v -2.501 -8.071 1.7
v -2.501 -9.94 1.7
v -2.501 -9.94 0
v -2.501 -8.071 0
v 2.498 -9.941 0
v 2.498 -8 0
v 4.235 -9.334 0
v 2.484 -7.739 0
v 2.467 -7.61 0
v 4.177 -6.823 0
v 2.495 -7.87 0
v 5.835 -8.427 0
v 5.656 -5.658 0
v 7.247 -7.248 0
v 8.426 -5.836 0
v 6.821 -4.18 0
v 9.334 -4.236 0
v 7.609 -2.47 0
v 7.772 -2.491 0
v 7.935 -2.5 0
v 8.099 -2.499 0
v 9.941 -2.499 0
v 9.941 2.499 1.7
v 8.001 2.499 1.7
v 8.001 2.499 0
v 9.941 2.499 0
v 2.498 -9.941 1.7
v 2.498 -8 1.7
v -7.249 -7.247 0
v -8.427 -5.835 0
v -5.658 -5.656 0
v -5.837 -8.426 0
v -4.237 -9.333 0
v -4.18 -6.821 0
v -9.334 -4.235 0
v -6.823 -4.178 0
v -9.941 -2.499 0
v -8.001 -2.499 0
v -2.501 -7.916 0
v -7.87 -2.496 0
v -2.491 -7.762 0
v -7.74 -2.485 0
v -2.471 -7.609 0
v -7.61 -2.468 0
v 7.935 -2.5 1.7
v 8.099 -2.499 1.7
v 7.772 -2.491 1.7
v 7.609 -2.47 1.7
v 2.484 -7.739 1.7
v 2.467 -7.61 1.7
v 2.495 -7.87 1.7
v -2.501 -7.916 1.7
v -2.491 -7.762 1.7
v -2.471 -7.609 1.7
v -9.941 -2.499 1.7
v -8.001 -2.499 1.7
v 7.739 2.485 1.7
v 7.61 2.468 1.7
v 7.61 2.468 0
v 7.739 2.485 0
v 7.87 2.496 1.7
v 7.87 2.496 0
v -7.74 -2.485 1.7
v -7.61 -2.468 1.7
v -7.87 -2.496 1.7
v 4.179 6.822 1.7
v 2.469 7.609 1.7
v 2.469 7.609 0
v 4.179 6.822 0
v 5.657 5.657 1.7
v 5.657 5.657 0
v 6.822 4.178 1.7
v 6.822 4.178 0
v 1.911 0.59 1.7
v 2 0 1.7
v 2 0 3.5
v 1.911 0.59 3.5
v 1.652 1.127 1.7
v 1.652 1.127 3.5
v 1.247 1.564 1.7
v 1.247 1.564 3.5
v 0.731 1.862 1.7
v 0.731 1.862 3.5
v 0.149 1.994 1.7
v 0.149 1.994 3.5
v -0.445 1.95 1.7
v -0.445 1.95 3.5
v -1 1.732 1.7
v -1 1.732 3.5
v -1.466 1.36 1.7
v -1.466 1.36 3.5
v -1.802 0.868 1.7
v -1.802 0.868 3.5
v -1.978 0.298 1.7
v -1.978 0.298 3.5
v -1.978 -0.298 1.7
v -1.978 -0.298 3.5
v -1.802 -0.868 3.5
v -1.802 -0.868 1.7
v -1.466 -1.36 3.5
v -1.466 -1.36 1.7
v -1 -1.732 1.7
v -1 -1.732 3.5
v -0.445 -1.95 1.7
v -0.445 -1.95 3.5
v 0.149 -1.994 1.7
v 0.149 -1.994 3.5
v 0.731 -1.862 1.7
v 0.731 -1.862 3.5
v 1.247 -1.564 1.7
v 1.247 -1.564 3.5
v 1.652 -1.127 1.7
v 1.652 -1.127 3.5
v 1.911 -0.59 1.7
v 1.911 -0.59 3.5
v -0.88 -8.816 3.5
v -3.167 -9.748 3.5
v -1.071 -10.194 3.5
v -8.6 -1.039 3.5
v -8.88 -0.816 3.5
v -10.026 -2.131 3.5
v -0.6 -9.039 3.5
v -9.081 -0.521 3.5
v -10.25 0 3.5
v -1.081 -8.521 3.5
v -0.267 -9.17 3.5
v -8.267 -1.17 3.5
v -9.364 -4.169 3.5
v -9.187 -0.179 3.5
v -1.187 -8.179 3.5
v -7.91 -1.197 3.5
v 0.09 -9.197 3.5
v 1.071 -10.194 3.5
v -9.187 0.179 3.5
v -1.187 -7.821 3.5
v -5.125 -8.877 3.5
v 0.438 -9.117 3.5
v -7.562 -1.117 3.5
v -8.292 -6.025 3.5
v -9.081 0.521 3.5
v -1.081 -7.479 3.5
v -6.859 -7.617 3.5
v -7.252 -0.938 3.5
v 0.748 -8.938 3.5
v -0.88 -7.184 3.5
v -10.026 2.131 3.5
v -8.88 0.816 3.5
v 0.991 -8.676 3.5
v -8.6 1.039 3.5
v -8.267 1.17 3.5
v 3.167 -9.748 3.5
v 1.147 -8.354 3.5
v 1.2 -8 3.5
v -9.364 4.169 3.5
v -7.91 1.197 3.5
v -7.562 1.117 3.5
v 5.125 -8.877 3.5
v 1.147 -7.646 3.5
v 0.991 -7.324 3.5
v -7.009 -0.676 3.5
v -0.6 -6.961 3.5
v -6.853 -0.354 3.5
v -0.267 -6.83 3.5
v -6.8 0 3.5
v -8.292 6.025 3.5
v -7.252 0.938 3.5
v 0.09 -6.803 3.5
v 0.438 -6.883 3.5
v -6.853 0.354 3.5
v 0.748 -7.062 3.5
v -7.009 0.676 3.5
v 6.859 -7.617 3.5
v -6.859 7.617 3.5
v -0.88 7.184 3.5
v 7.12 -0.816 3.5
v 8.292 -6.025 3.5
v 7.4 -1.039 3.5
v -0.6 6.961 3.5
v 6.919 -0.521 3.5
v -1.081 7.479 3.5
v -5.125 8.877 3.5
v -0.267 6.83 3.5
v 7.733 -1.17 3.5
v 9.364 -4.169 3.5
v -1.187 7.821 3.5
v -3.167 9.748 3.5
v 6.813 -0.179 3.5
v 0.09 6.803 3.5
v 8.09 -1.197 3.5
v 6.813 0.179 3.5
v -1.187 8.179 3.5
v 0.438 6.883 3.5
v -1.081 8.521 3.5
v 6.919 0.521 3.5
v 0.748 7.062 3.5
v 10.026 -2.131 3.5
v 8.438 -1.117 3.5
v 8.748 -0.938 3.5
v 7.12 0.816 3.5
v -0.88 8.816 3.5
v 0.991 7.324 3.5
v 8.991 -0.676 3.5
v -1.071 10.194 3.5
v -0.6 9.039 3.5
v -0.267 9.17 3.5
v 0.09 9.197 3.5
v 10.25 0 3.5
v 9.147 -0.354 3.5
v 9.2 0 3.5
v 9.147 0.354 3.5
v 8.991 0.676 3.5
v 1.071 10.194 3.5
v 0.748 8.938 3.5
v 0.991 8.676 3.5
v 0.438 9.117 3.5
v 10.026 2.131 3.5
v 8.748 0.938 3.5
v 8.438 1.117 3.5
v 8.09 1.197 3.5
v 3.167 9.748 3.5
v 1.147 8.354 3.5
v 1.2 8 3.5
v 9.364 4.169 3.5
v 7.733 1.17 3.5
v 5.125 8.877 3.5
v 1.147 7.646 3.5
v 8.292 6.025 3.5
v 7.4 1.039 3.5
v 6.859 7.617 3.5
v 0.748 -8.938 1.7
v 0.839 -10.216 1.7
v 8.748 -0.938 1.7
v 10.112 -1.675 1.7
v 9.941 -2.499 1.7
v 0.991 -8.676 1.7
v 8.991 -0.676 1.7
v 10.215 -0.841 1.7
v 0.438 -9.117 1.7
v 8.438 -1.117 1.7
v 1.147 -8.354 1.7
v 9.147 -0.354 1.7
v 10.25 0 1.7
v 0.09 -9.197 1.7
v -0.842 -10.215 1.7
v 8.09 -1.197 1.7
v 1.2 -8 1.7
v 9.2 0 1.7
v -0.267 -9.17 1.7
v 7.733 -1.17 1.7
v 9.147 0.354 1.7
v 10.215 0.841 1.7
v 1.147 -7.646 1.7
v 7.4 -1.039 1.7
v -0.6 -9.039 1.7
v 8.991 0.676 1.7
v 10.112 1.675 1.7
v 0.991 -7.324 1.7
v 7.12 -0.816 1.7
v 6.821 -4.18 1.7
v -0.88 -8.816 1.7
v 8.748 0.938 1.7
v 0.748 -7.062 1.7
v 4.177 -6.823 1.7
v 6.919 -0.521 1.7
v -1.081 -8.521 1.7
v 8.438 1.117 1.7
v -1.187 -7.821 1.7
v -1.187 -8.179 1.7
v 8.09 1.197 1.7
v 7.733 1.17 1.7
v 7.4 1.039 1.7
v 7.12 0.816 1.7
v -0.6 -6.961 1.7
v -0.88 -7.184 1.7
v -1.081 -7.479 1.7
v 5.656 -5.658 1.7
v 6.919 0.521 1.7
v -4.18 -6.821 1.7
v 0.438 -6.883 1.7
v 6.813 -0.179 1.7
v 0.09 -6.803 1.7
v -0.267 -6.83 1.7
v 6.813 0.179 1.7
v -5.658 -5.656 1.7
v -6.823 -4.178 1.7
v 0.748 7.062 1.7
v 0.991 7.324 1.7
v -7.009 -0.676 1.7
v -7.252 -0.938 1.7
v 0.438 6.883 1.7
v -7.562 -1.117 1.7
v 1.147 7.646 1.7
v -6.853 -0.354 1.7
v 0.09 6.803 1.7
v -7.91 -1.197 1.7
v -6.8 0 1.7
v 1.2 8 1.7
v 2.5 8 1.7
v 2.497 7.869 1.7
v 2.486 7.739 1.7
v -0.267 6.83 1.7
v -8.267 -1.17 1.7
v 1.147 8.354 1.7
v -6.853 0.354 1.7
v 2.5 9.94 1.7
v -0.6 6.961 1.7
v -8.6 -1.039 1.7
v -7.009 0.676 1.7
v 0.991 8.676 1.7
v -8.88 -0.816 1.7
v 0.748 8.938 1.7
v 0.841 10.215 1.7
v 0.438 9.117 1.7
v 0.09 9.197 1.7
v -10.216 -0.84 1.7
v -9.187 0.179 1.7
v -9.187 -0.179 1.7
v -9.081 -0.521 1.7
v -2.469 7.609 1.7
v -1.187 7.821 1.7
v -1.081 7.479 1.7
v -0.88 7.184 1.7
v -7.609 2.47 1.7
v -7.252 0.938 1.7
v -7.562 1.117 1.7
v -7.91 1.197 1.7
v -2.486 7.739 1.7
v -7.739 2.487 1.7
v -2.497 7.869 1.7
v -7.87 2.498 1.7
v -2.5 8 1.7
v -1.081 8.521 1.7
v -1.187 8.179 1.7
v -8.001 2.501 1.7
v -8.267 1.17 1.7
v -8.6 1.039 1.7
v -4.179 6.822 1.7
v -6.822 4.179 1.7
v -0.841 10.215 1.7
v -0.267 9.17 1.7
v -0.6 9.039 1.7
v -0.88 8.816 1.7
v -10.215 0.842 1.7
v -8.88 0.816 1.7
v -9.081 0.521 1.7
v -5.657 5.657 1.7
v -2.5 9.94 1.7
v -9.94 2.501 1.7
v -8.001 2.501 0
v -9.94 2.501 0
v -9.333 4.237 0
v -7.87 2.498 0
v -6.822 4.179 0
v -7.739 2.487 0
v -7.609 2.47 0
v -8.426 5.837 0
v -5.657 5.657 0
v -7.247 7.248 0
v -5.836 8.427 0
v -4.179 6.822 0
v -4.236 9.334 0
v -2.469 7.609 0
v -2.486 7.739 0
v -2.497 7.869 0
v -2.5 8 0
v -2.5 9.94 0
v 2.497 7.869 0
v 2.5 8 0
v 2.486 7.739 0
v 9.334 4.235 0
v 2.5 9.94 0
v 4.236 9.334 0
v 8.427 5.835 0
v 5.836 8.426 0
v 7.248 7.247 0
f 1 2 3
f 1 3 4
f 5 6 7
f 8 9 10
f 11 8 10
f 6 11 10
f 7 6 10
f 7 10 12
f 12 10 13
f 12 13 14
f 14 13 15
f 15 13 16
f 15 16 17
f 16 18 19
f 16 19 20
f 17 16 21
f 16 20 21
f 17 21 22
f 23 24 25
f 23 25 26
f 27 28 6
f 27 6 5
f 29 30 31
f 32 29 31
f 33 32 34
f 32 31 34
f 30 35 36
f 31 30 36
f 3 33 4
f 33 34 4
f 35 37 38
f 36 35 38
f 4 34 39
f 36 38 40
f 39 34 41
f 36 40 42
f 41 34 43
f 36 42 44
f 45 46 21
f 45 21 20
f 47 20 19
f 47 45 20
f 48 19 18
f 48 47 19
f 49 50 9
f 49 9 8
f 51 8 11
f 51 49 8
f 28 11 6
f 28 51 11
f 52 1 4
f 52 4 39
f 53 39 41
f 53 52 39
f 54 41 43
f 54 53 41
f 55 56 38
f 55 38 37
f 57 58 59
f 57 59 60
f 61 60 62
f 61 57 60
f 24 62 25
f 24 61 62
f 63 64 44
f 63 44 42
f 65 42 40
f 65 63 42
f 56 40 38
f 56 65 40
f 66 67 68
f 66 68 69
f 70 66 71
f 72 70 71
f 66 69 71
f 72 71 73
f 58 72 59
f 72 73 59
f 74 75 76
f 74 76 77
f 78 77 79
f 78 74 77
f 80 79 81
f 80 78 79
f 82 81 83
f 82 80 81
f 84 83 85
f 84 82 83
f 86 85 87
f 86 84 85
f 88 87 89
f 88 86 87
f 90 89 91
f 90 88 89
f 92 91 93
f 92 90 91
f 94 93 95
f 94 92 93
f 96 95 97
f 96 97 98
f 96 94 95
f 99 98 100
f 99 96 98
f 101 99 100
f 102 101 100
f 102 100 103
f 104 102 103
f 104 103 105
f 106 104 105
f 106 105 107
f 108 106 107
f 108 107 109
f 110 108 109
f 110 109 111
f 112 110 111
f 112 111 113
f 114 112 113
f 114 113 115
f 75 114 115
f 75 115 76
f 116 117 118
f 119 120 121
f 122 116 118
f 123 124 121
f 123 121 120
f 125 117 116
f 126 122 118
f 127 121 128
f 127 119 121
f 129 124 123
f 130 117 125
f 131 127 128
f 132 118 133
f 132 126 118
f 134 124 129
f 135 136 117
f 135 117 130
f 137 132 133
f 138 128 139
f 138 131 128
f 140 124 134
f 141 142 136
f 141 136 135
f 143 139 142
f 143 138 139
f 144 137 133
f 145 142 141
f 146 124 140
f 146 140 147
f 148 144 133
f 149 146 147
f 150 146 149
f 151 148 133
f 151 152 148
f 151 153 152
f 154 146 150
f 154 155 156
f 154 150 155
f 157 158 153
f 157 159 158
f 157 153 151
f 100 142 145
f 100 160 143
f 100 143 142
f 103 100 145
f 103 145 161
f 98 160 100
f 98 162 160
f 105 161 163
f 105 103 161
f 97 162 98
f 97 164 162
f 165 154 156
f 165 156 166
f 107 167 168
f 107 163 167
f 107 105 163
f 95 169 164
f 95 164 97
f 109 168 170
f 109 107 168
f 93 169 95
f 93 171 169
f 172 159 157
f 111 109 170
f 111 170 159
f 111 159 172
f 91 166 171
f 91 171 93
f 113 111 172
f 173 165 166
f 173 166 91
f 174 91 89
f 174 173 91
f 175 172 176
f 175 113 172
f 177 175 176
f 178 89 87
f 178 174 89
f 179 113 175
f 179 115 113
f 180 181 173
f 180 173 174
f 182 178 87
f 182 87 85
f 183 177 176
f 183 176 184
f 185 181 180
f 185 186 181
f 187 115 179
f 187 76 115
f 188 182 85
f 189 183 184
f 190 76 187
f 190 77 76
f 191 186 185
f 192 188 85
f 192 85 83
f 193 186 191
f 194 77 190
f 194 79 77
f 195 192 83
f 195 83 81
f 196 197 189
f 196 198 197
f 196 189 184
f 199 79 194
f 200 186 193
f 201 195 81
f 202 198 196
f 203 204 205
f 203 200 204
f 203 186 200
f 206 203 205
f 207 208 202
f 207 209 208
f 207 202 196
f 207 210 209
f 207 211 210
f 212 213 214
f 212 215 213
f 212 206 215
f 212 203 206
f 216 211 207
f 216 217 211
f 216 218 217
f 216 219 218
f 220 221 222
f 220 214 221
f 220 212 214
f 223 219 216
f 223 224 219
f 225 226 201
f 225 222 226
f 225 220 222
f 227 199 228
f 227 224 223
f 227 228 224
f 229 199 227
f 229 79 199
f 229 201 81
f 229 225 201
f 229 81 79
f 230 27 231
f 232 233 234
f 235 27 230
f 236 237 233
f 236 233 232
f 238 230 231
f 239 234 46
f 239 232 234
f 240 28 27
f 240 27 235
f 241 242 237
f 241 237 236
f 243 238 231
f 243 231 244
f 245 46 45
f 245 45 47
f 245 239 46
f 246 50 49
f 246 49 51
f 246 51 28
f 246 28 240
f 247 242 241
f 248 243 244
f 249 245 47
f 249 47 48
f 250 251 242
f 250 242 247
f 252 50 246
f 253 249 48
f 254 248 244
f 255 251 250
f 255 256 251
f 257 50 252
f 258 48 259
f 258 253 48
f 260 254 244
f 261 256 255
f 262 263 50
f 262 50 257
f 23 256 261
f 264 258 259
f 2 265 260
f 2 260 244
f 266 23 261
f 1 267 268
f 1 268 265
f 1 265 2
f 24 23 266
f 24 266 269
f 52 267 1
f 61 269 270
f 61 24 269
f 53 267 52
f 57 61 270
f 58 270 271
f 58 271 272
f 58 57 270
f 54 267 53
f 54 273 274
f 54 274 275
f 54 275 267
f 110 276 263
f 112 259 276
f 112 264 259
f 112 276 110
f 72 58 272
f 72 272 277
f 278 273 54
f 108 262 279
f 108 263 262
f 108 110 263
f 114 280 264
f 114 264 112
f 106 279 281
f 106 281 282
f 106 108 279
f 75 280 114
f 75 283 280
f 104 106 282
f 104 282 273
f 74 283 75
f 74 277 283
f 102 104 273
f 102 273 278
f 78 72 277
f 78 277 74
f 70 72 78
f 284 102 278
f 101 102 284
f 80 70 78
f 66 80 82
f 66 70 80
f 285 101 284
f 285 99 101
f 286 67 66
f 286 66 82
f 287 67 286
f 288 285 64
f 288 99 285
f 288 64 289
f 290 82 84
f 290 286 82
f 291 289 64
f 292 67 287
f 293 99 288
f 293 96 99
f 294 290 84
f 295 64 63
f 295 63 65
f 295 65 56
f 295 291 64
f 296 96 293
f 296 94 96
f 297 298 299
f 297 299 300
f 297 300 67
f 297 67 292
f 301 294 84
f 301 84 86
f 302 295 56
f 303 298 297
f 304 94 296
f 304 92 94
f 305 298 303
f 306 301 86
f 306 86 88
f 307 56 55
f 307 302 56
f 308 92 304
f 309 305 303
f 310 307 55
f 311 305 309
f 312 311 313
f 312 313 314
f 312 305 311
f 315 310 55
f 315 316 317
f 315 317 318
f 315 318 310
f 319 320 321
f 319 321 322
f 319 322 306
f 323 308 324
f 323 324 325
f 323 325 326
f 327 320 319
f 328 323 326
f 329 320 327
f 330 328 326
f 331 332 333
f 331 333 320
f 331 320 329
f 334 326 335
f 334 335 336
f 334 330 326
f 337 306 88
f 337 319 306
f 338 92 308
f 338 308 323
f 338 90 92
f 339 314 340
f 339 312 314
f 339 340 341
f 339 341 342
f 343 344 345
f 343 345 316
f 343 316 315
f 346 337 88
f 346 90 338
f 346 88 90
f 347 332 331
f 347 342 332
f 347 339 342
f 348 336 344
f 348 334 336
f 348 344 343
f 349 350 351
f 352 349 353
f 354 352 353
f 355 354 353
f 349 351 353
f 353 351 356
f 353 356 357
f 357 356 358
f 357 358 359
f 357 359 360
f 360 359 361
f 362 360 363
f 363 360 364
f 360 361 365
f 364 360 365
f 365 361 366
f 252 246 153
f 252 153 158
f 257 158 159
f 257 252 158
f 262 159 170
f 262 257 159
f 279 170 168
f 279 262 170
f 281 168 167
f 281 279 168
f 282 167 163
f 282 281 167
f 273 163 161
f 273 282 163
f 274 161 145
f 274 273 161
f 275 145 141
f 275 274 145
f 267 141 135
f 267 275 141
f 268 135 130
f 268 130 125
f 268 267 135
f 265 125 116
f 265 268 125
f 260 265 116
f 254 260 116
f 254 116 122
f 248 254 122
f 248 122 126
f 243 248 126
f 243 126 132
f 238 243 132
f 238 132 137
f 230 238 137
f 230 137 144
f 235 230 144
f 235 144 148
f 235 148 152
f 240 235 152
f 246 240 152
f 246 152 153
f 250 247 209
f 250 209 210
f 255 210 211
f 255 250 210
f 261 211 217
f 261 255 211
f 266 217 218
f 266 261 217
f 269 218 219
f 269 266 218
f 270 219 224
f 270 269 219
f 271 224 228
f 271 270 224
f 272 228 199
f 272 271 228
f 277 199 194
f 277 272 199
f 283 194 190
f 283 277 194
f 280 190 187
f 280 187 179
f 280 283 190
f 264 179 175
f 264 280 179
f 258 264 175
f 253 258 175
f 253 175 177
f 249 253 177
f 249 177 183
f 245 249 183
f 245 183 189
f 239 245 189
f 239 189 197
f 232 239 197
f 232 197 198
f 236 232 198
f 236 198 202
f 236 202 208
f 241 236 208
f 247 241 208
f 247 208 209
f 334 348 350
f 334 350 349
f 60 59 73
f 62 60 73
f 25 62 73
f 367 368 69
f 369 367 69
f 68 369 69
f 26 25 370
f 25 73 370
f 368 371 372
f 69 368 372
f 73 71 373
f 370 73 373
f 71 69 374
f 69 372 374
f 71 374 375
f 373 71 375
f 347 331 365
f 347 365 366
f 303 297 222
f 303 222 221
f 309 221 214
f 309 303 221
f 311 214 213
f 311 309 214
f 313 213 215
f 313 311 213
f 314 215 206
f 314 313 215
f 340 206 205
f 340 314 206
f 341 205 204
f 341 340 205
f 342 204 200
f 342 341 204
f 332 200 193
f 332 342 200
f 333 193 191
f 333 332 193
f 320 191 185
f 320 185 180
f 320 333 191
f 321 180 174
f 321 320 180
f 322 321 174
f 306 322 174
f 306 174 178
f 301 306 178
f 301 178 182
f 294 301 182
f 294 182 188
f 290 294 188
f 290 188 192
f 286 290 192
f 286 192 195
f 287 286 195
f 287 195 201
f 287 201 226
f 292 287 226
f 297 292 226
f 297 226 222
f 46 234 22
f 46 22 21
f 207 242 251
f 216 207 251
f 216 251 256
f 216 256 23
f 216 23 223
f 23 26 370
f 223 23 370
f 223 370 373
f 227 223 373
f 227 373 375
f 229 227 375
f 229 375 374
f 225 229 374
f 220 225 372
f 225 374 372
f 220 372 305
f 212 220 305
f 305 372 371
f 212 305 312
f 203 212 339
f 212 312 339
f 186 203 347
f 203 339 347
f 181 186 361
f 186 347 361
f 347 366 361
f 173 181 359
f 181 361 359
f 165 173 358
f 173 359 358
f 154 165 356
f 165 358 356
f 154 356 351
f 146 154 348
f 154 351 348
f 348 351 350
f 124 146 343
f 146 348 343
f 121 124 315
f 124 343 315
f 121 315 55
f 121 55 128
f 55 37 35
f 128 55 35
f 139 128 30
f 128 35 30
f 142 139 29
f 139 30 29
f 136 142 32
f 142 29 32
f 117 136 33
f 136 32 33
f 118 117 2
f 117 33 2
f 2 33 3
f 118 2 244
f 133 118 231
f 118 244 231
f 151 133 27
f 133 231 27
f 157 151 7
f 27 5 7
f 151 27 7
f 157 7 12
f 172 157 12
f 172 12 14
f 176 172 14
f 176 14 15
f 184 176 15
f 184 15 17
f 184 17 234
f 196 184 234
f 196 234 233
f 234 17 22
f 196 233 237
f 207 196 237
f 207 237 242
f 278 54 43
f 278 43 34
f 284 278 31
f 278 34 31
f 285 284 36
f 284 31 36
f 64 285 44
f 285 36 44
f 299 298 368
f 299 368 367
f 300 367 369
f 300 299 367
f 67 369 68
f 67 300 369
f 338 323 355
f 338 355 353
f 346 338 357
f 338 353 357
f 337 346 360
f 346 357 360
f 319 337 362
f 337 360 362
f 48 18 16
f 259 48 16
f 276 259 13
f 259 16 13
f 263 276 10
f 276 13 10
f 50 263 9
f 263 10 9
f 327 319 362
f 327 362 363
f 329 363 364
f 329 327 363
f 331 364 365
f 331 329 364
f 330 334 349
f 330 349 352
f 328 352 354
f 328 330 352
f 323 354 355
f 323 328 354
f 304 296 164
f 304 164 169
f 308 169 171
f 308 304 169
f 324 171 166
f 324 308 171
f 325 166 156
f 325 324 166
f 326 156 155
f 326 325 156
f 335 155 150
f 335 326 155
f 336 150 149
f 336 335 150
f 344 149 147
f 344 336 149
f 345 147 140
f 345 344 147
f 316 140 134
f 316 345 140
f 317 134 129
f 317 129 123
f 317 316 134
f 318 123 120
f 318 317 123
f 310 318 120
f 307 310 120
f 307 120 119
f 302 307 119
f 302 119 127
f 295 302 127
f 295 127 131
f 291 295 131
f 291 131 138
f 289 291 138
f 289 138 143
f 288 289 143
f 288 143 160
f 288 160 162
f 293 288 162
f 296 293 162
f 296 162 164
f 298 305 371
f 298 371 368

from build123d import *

# Parameters (mm, degrees)
SKETCH1_R              = 10.25
SKETCH1_R_2            = 2
SKETCH1_R_3            = 1.2
BOSS_EXTRUDE1_DEPTH    = 3.5
CUT_EXTRUDE2_START     = -1.7
CUT_EXTRUDE2_OUTLINE_R = 1.2
CUT_EXTRUDE2_DEPTH     = 1.7
SKETCH6_R              = 8
CUT_EXTRUDE4_DEPTH     = 1.7


# Read off the part's stored shape, not the designer's step: Cut-Extrude2
with BuildPart() as part:
    # Sketch1 → Boss-Extrude1 (new body)
    with BuildSketch(Plane.XY):
        Circle(SKETCH1_R)
        Circle(SKETCH1_R_2, mode=Mode.SUBTRACT)
        with Locations((0, 8)):
            Circle(SKETCH1_R_3, mode=Mode.SUBTRACT)
        with Locations((8, 0)):
            Circle(SKETCH1_R_3, mode=Mode.SUBTRACT)
        with Locations((0, -8)):
            Circle(SKETCH1_R_3, mode=Mode.SUBTRACT)
        with Locations((-8, 0)):
            Circle(SKETCH1_R_3, mode=Mode.SUBTRACT)
    extrude(amount=BOSS_EXTRUDE1_DEPTH)

    # Cut-Extrude2 outline → Cut-Extrude2 (cut)
    # profile 1 of 4: a face of its own
    with BuildSketch(Plane(origin=(0, 0, 0), x_dir=(-1, 0, 0), z_dir=(0, 0, -1)).offset(CUT_EXTRUDE2_START)):
        with BuildLine():
            Line((-9.94069912, -2.499), (-8.098979998, -2.499))
            ThreePointArc((-8.098979998, -2.499), (-5.49948025, -0.050000196), (-8.000999999, 2.4989992))
            Line((-8.000999999, 2.4989992), (-9.940699321, 2.4989992))
            ThreePointArc((-9.940699321, 2.4989992), (-10.25, -4.12e-07), (-9.94069912, -2.499))
        make_face()
        with Locations((-8, 0)):
            Circle(CUT_EXTRUDE2_OUTLINE_R, mode=Mode.SUBTRACT)
    # profile 2 of 4: a face of its own
    with BuildSketch(Plane(origin=(0, 0, 0), x_dir=(-1, 0, 0), z_dir=(0, 0, -1)).offset(CUT_EXTRUDE2_START)):
        with BuildLine():
            Line((-2.498, -8), (-2.498, -9.940950458))
            ThreePointArc((-2.498, -9.940950458), (0.001546691, -10.249999883), (2.501, -9.940196125))
            Line((2.501, -9.940196125), (2.5010004, -8.070689462))
            ThreePointArc((2.5010004, -8.070689462), (0.037348265, -5.500249912), (-2.498, -8))
        make_face()
        with Locations((0, -8)):
            Circle(CUT_EXTRUDE2_OUTLINE_R, mode=Mode.SUBTRACT)
    # profile 3 of 4: a face of its own
    with BuildSketch(Plane(origin=(0, 0, 0), x_dir=(-1, 0, 0), z_dir=(0, 0, -1)).offset(CUT_EXTRUDE2_START)):
        with BuildLine():
            ThreePointArc((2.5, 9.940447676), (0, 10.25), (-2.5, 9.940447676))
            Line((-2.5, 9.940447676), (-2.5, 8))
            ThreePointArc((-2.5, 8), (0, 5.5), (2.5, 8))
            Line((2.5, 8), (2.5, 9.940447676))
        make_face()
        with Locations((0, 8)):
            Circle(CUT_EXTRUDE2_OUTLINE_R, mode=Mode.SUBTRACT)
    # profile 4 of 4: a face of its own
    with BuildSketch(Plane(origin=(0, 0, 0), x_dir=(-1, 0, 0), z_dir=(0, 0, -1)).offset(CUT_EXTRUDE2_START)):
        with BuildLine():
            Line((8.001, -2.499), (9.94069912, -2.499))
            ThreePointArc((9.94069912, -2.499), (10.249999948, 0.001031141), (9.940196125, 2.501))
            Line((9.940196125, 2.501), (8.001, 2.501))
            ThreePointArc((8.001, 2.501), (5.501, 0.001), (8.001, -2.499))
        make_face()
        with Locations((8, 0)):
            Circle(CUT_EXTRUDE2_OUTLINE_R, mode=Mode.SUBTRACT)
    extrude(amount=CUT_EXTRUDE2_DEPTH, mode=Mode.SUBTRACT)

    # Sketch6 → Cut-Extrude4 (cut)
    with BuildSketch(Plane(origin=(0, 0, 0), x_dir=(-1, 0, 0), z_dir=(0, 0, -1))):
        Circle(SKETCH6_R)
    extrude(amount=-CUT_EXTRUDE4_DEPTH, mode=Mode.SUBTRACT)


solid = part.part
